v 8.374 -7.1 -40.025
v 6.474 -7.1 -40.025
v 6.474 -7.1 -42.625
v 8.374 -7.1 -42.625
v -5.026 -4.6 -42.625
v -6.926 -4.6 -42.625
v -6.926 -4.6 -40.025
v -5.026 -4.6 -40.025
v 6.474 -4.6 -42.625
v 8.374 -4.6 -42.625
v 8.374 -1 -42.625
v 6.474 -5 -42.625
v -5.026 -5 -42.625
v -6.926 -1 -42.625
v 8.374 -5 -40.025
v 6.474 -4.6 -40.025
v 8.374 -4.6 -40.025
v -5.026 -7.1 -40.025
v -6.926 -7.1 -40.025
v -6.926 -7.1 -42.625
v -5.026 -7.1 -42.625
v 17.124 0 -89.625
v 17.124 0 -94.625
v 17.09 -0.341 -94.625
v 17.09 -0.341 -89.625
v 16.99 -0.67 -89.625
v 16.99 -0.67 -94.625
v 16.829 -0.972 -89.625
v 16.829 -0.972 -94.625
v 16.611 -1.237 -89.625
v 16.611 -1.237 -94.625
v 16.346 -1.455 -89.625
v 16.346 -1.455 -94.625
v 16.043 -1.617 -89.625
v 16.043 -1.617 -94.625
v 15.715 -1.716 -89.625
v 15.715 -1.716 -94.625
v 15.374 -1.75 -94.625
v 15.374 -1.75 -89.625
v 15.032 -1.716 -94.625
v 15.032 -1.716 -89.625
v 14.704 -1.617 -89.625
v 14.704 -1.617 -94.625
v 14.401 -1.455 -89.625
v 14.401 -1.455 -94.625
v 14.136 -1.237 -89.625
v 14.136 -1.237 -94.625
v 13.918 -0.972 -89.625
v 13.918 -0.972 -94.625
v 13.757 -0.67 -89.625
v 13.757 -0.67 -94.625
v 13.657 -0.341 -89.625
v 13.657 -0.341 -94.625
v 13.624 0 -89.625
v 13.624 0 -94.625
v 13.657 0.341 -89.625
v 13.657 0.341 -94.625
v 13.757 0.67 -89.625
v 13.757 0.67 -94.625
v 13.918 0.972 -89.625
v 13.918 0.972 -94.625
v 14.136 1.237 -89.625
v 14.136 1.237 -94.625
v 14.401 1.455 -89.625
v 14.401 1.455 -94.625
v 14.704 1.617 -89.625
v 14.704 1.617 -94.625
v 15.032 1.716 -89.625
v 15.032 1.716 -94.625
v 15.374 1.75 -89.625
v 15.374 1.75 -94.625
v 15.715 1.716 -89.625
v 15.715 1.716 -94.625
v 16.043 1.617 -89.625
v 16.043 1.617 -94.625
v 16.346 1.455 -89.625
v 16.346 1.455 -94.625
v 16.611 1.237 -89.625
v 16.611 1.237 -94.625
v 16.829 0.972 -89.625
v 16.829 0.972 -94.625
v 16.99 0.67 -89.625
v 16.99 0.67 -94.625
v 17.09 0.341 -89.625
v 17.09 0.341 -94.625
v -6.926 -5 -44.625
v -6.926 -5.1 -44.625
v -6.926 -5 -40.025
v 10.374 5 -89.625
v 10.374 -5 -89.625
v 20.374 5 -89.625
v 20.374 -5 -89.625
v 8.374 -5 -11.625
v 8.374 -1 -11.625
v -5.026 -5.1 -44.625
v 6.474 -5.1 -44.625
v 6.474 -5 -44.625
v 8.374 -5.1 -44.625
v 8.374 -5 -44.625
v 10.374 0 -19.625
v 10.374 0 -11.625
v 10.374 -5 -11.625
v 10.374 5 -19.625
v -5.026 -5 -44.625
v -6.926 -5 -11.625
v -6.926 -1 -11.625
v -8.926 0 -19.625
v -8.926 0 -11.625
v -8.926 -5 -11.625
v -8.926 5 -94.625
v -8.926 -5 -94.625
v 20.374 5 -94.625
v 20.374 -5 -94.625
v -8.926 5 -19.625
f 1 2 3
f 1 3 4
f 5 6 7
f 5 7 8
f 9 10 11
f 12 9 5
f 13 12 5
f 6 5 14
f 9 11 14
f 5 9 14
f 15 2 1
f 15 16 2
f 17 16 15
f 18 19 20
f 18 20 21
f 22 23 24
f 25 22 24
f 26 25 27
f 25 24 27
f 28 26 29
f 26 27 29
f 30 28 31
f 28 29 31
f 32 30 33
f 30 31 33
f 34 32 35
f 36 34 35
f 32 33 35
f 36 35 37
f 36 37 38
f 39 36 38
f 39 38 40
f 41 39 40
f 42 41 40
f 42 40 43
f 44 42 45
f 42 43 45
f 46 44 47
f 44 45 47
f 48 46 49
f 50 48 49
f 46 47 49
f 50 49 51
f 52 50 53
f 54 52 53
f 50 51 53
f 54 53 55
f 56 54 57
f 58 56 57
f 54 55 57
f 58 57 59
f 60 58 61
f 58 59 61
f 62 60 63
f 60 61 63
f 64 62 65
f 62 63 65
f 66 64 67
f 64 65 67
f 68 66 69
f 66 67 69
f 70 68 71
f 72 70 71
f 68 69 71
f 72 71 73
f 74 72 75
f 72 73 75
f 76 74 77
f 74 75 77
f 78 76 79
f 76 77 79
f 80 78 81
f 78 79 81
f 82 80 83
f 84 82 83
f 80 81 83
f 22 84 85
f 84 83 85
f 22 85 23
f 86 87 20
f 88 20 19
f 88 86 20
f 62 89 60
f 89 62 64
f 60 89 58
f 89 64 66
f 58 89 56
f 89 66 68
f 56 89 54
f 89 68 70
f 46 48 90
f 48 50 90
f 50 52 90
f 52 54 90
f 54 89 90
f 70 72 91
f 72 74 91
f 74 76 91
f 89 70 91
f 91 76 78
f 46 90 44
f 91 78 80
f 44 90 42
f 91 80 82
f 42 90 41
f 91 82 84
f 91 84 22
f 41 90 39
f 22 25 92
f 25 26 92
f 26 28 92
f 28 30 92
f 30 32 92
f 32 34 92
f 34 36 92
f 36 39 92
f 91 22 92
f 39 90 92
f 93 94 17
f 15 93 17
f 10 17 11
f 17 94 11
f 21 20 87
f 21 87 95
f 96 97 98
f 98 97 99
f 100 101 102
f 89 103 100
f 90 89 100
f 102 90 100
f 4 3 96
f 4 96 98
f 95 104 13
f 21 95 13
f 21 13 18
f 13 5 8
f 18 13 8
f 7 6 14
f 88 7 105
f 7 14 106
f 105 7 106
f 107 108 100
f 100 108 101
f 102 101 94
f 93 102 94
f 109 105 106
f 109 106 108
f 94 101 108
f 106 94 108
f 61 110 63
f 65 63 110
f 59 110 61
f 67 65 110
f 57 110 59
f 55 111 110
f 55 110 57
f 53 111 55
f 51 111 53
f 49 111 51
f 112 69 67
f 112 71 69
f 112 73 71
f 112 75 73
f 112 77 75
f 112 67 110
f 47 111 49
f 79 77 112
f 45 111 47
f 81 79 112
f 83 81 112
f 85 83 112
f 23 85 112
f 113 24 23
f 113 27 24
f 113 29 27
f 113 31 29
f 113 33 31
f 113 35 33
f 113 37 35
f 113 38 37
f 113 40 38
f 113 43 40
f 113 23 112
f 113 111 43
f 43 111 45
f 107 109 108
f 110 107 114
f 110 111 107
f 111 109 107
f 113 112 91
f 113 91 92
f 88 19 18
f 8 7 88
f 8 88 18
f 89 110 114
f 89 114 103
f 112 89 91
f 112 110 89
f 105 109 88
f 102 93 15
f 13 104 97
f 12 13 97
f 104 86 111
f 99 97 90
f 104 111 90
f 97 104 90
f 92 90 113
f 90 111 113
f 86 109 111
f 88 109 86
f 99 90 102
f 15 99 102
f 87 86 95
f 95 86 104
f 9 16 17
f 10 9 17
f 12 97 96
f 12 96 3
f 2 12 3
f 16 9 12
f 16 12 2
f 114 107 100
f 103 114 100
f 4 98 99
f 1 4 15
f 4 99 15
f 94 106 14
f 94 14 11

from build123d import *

# Parameters (mm, degrees)
F0_W      = 15.3
F0_H      = 31
F1_DEPTH  = 1
F2_DEPTH  = 5
F3_W      = 1.9
F3_H      = 2.1
F3_H_2    = 0.4
F4_DEPTH  = 2.6
F5_W      = 1.9
F5_H      = 2
F6_DEPTH  = 2.1
F7_W      = 19.3
F7_H      = 5
F8_DEPTH  = 50
F9_SIZE   = 2
F10_DEPTH = 25
F11_W     = 10
F11_H     = 10
F11_R     = 1.75
F12_DEPTH = 5


with BuildPart() as f1:
    # F0 (on Front) → F1 (new body)
    with BuildSketch(Plane.XZ):
        with Locations((0.723570025, -27.1247635409)):
            Rectangle(F0_W, F0_H)
    extrude(amount=F1_DEPTH)

    # F0 (on Front) → F2 (join)
    with BuildSketch(Plane.XZ):
        Polygon((-6.926429975, -42.6247635409), (-6.926429975, -11.6247635409), (-8.926429975, -11.6247635409), (-8.926429975, -44.6247635409), (10.373570025, -44.6247635409), (10.373570025, -11.6247635409), (8.373570025, -11.6247635409), (8.373570025, -42.6247635409), align=None)
    extrude(amount=F2_DEPTH)

    # F3 (on face) → F4 (join)
    with BuildSketch(Plane.XY.offset(-42.6247635409)):
        with Locations((-5.976429975, -6.05)):
            Rectangle(F3_W, F3_H)
        with Locations((-5.976429975, -4.8)):
            Rectangle(F3_W, F3_H_2)
        with Locations((7.423570025, -6.05)):
            Rectangle(F3_W, F3_H)
        with Locations((7.423570025, -4.8)):
            Rectangle(F3_W, F3_H_2)
    extrude(amount=F4_DEPTH)

    # F5 (on face) → F6 (join)
    with BuildSketch(Plane.XZ.offset(5)):
        with Locations((-5.976429975, -43.6247635409)):
            Rectangle(F5_W, F5_H)
        with Locations((7.423570025, -43.6247635409)):
            Rectangle(F5_W, F5_H)
    extrude(amount=F6_DEPTH)

    # F7 (on face) → F8 (join)
    with BuildSketch(Plane(origin=(0, 0, -44.6247635409), x_dir=(1, 0, 0), z_dir=(0, 0, -1))):
        with Locations((0.723570025, -2.5)):
            Rectangle(F7_W, F7_H)
        Polygon((-6.926429975, 5), (-8.926429975, 5), (-8.926429975, 0), (10.373570025, 0), (10.373570025, 5), (8.373570025, 5), (6.473570025, 5), (-5.026429975, 5), align=None)
    extrude(amount=F8_DEPTH)

    # F9
    f9_edges = [f1.edges().sort_by_distance(p)[0] for p in [
        (7.42357, -7.1, -44.624764),
        (-5.97643, -7.1, -44.624764),
    ]]
    chamfer(f9_edges, length=F9_SIZE)

    # F10 (add): a face of the model
    f10_faces = [f1.faces().sort_by_distance(p)[0] for p in [
        (0.723570025, 2.5, -44.6247635409),
    ]]
    extrude(f10_faces, amount=F10_DEPTH)

    # F11 (on face) → F12 (join)
    with BuildSketch(Plane(origin=(0, 0, -94.6247635409), x_dir=(1, 0, 0), z_dir=(0, 0, -1))):
        with Locations((15.373570025, 0)):
            Rectangle(F11_W, F11_H)
        with Locations((15.373570025, 0)):
            Circle(F11_R, mode=Mode.SUBTRACT)
    extrude(amount=-F12_DEPTH)


solid = f1.part
